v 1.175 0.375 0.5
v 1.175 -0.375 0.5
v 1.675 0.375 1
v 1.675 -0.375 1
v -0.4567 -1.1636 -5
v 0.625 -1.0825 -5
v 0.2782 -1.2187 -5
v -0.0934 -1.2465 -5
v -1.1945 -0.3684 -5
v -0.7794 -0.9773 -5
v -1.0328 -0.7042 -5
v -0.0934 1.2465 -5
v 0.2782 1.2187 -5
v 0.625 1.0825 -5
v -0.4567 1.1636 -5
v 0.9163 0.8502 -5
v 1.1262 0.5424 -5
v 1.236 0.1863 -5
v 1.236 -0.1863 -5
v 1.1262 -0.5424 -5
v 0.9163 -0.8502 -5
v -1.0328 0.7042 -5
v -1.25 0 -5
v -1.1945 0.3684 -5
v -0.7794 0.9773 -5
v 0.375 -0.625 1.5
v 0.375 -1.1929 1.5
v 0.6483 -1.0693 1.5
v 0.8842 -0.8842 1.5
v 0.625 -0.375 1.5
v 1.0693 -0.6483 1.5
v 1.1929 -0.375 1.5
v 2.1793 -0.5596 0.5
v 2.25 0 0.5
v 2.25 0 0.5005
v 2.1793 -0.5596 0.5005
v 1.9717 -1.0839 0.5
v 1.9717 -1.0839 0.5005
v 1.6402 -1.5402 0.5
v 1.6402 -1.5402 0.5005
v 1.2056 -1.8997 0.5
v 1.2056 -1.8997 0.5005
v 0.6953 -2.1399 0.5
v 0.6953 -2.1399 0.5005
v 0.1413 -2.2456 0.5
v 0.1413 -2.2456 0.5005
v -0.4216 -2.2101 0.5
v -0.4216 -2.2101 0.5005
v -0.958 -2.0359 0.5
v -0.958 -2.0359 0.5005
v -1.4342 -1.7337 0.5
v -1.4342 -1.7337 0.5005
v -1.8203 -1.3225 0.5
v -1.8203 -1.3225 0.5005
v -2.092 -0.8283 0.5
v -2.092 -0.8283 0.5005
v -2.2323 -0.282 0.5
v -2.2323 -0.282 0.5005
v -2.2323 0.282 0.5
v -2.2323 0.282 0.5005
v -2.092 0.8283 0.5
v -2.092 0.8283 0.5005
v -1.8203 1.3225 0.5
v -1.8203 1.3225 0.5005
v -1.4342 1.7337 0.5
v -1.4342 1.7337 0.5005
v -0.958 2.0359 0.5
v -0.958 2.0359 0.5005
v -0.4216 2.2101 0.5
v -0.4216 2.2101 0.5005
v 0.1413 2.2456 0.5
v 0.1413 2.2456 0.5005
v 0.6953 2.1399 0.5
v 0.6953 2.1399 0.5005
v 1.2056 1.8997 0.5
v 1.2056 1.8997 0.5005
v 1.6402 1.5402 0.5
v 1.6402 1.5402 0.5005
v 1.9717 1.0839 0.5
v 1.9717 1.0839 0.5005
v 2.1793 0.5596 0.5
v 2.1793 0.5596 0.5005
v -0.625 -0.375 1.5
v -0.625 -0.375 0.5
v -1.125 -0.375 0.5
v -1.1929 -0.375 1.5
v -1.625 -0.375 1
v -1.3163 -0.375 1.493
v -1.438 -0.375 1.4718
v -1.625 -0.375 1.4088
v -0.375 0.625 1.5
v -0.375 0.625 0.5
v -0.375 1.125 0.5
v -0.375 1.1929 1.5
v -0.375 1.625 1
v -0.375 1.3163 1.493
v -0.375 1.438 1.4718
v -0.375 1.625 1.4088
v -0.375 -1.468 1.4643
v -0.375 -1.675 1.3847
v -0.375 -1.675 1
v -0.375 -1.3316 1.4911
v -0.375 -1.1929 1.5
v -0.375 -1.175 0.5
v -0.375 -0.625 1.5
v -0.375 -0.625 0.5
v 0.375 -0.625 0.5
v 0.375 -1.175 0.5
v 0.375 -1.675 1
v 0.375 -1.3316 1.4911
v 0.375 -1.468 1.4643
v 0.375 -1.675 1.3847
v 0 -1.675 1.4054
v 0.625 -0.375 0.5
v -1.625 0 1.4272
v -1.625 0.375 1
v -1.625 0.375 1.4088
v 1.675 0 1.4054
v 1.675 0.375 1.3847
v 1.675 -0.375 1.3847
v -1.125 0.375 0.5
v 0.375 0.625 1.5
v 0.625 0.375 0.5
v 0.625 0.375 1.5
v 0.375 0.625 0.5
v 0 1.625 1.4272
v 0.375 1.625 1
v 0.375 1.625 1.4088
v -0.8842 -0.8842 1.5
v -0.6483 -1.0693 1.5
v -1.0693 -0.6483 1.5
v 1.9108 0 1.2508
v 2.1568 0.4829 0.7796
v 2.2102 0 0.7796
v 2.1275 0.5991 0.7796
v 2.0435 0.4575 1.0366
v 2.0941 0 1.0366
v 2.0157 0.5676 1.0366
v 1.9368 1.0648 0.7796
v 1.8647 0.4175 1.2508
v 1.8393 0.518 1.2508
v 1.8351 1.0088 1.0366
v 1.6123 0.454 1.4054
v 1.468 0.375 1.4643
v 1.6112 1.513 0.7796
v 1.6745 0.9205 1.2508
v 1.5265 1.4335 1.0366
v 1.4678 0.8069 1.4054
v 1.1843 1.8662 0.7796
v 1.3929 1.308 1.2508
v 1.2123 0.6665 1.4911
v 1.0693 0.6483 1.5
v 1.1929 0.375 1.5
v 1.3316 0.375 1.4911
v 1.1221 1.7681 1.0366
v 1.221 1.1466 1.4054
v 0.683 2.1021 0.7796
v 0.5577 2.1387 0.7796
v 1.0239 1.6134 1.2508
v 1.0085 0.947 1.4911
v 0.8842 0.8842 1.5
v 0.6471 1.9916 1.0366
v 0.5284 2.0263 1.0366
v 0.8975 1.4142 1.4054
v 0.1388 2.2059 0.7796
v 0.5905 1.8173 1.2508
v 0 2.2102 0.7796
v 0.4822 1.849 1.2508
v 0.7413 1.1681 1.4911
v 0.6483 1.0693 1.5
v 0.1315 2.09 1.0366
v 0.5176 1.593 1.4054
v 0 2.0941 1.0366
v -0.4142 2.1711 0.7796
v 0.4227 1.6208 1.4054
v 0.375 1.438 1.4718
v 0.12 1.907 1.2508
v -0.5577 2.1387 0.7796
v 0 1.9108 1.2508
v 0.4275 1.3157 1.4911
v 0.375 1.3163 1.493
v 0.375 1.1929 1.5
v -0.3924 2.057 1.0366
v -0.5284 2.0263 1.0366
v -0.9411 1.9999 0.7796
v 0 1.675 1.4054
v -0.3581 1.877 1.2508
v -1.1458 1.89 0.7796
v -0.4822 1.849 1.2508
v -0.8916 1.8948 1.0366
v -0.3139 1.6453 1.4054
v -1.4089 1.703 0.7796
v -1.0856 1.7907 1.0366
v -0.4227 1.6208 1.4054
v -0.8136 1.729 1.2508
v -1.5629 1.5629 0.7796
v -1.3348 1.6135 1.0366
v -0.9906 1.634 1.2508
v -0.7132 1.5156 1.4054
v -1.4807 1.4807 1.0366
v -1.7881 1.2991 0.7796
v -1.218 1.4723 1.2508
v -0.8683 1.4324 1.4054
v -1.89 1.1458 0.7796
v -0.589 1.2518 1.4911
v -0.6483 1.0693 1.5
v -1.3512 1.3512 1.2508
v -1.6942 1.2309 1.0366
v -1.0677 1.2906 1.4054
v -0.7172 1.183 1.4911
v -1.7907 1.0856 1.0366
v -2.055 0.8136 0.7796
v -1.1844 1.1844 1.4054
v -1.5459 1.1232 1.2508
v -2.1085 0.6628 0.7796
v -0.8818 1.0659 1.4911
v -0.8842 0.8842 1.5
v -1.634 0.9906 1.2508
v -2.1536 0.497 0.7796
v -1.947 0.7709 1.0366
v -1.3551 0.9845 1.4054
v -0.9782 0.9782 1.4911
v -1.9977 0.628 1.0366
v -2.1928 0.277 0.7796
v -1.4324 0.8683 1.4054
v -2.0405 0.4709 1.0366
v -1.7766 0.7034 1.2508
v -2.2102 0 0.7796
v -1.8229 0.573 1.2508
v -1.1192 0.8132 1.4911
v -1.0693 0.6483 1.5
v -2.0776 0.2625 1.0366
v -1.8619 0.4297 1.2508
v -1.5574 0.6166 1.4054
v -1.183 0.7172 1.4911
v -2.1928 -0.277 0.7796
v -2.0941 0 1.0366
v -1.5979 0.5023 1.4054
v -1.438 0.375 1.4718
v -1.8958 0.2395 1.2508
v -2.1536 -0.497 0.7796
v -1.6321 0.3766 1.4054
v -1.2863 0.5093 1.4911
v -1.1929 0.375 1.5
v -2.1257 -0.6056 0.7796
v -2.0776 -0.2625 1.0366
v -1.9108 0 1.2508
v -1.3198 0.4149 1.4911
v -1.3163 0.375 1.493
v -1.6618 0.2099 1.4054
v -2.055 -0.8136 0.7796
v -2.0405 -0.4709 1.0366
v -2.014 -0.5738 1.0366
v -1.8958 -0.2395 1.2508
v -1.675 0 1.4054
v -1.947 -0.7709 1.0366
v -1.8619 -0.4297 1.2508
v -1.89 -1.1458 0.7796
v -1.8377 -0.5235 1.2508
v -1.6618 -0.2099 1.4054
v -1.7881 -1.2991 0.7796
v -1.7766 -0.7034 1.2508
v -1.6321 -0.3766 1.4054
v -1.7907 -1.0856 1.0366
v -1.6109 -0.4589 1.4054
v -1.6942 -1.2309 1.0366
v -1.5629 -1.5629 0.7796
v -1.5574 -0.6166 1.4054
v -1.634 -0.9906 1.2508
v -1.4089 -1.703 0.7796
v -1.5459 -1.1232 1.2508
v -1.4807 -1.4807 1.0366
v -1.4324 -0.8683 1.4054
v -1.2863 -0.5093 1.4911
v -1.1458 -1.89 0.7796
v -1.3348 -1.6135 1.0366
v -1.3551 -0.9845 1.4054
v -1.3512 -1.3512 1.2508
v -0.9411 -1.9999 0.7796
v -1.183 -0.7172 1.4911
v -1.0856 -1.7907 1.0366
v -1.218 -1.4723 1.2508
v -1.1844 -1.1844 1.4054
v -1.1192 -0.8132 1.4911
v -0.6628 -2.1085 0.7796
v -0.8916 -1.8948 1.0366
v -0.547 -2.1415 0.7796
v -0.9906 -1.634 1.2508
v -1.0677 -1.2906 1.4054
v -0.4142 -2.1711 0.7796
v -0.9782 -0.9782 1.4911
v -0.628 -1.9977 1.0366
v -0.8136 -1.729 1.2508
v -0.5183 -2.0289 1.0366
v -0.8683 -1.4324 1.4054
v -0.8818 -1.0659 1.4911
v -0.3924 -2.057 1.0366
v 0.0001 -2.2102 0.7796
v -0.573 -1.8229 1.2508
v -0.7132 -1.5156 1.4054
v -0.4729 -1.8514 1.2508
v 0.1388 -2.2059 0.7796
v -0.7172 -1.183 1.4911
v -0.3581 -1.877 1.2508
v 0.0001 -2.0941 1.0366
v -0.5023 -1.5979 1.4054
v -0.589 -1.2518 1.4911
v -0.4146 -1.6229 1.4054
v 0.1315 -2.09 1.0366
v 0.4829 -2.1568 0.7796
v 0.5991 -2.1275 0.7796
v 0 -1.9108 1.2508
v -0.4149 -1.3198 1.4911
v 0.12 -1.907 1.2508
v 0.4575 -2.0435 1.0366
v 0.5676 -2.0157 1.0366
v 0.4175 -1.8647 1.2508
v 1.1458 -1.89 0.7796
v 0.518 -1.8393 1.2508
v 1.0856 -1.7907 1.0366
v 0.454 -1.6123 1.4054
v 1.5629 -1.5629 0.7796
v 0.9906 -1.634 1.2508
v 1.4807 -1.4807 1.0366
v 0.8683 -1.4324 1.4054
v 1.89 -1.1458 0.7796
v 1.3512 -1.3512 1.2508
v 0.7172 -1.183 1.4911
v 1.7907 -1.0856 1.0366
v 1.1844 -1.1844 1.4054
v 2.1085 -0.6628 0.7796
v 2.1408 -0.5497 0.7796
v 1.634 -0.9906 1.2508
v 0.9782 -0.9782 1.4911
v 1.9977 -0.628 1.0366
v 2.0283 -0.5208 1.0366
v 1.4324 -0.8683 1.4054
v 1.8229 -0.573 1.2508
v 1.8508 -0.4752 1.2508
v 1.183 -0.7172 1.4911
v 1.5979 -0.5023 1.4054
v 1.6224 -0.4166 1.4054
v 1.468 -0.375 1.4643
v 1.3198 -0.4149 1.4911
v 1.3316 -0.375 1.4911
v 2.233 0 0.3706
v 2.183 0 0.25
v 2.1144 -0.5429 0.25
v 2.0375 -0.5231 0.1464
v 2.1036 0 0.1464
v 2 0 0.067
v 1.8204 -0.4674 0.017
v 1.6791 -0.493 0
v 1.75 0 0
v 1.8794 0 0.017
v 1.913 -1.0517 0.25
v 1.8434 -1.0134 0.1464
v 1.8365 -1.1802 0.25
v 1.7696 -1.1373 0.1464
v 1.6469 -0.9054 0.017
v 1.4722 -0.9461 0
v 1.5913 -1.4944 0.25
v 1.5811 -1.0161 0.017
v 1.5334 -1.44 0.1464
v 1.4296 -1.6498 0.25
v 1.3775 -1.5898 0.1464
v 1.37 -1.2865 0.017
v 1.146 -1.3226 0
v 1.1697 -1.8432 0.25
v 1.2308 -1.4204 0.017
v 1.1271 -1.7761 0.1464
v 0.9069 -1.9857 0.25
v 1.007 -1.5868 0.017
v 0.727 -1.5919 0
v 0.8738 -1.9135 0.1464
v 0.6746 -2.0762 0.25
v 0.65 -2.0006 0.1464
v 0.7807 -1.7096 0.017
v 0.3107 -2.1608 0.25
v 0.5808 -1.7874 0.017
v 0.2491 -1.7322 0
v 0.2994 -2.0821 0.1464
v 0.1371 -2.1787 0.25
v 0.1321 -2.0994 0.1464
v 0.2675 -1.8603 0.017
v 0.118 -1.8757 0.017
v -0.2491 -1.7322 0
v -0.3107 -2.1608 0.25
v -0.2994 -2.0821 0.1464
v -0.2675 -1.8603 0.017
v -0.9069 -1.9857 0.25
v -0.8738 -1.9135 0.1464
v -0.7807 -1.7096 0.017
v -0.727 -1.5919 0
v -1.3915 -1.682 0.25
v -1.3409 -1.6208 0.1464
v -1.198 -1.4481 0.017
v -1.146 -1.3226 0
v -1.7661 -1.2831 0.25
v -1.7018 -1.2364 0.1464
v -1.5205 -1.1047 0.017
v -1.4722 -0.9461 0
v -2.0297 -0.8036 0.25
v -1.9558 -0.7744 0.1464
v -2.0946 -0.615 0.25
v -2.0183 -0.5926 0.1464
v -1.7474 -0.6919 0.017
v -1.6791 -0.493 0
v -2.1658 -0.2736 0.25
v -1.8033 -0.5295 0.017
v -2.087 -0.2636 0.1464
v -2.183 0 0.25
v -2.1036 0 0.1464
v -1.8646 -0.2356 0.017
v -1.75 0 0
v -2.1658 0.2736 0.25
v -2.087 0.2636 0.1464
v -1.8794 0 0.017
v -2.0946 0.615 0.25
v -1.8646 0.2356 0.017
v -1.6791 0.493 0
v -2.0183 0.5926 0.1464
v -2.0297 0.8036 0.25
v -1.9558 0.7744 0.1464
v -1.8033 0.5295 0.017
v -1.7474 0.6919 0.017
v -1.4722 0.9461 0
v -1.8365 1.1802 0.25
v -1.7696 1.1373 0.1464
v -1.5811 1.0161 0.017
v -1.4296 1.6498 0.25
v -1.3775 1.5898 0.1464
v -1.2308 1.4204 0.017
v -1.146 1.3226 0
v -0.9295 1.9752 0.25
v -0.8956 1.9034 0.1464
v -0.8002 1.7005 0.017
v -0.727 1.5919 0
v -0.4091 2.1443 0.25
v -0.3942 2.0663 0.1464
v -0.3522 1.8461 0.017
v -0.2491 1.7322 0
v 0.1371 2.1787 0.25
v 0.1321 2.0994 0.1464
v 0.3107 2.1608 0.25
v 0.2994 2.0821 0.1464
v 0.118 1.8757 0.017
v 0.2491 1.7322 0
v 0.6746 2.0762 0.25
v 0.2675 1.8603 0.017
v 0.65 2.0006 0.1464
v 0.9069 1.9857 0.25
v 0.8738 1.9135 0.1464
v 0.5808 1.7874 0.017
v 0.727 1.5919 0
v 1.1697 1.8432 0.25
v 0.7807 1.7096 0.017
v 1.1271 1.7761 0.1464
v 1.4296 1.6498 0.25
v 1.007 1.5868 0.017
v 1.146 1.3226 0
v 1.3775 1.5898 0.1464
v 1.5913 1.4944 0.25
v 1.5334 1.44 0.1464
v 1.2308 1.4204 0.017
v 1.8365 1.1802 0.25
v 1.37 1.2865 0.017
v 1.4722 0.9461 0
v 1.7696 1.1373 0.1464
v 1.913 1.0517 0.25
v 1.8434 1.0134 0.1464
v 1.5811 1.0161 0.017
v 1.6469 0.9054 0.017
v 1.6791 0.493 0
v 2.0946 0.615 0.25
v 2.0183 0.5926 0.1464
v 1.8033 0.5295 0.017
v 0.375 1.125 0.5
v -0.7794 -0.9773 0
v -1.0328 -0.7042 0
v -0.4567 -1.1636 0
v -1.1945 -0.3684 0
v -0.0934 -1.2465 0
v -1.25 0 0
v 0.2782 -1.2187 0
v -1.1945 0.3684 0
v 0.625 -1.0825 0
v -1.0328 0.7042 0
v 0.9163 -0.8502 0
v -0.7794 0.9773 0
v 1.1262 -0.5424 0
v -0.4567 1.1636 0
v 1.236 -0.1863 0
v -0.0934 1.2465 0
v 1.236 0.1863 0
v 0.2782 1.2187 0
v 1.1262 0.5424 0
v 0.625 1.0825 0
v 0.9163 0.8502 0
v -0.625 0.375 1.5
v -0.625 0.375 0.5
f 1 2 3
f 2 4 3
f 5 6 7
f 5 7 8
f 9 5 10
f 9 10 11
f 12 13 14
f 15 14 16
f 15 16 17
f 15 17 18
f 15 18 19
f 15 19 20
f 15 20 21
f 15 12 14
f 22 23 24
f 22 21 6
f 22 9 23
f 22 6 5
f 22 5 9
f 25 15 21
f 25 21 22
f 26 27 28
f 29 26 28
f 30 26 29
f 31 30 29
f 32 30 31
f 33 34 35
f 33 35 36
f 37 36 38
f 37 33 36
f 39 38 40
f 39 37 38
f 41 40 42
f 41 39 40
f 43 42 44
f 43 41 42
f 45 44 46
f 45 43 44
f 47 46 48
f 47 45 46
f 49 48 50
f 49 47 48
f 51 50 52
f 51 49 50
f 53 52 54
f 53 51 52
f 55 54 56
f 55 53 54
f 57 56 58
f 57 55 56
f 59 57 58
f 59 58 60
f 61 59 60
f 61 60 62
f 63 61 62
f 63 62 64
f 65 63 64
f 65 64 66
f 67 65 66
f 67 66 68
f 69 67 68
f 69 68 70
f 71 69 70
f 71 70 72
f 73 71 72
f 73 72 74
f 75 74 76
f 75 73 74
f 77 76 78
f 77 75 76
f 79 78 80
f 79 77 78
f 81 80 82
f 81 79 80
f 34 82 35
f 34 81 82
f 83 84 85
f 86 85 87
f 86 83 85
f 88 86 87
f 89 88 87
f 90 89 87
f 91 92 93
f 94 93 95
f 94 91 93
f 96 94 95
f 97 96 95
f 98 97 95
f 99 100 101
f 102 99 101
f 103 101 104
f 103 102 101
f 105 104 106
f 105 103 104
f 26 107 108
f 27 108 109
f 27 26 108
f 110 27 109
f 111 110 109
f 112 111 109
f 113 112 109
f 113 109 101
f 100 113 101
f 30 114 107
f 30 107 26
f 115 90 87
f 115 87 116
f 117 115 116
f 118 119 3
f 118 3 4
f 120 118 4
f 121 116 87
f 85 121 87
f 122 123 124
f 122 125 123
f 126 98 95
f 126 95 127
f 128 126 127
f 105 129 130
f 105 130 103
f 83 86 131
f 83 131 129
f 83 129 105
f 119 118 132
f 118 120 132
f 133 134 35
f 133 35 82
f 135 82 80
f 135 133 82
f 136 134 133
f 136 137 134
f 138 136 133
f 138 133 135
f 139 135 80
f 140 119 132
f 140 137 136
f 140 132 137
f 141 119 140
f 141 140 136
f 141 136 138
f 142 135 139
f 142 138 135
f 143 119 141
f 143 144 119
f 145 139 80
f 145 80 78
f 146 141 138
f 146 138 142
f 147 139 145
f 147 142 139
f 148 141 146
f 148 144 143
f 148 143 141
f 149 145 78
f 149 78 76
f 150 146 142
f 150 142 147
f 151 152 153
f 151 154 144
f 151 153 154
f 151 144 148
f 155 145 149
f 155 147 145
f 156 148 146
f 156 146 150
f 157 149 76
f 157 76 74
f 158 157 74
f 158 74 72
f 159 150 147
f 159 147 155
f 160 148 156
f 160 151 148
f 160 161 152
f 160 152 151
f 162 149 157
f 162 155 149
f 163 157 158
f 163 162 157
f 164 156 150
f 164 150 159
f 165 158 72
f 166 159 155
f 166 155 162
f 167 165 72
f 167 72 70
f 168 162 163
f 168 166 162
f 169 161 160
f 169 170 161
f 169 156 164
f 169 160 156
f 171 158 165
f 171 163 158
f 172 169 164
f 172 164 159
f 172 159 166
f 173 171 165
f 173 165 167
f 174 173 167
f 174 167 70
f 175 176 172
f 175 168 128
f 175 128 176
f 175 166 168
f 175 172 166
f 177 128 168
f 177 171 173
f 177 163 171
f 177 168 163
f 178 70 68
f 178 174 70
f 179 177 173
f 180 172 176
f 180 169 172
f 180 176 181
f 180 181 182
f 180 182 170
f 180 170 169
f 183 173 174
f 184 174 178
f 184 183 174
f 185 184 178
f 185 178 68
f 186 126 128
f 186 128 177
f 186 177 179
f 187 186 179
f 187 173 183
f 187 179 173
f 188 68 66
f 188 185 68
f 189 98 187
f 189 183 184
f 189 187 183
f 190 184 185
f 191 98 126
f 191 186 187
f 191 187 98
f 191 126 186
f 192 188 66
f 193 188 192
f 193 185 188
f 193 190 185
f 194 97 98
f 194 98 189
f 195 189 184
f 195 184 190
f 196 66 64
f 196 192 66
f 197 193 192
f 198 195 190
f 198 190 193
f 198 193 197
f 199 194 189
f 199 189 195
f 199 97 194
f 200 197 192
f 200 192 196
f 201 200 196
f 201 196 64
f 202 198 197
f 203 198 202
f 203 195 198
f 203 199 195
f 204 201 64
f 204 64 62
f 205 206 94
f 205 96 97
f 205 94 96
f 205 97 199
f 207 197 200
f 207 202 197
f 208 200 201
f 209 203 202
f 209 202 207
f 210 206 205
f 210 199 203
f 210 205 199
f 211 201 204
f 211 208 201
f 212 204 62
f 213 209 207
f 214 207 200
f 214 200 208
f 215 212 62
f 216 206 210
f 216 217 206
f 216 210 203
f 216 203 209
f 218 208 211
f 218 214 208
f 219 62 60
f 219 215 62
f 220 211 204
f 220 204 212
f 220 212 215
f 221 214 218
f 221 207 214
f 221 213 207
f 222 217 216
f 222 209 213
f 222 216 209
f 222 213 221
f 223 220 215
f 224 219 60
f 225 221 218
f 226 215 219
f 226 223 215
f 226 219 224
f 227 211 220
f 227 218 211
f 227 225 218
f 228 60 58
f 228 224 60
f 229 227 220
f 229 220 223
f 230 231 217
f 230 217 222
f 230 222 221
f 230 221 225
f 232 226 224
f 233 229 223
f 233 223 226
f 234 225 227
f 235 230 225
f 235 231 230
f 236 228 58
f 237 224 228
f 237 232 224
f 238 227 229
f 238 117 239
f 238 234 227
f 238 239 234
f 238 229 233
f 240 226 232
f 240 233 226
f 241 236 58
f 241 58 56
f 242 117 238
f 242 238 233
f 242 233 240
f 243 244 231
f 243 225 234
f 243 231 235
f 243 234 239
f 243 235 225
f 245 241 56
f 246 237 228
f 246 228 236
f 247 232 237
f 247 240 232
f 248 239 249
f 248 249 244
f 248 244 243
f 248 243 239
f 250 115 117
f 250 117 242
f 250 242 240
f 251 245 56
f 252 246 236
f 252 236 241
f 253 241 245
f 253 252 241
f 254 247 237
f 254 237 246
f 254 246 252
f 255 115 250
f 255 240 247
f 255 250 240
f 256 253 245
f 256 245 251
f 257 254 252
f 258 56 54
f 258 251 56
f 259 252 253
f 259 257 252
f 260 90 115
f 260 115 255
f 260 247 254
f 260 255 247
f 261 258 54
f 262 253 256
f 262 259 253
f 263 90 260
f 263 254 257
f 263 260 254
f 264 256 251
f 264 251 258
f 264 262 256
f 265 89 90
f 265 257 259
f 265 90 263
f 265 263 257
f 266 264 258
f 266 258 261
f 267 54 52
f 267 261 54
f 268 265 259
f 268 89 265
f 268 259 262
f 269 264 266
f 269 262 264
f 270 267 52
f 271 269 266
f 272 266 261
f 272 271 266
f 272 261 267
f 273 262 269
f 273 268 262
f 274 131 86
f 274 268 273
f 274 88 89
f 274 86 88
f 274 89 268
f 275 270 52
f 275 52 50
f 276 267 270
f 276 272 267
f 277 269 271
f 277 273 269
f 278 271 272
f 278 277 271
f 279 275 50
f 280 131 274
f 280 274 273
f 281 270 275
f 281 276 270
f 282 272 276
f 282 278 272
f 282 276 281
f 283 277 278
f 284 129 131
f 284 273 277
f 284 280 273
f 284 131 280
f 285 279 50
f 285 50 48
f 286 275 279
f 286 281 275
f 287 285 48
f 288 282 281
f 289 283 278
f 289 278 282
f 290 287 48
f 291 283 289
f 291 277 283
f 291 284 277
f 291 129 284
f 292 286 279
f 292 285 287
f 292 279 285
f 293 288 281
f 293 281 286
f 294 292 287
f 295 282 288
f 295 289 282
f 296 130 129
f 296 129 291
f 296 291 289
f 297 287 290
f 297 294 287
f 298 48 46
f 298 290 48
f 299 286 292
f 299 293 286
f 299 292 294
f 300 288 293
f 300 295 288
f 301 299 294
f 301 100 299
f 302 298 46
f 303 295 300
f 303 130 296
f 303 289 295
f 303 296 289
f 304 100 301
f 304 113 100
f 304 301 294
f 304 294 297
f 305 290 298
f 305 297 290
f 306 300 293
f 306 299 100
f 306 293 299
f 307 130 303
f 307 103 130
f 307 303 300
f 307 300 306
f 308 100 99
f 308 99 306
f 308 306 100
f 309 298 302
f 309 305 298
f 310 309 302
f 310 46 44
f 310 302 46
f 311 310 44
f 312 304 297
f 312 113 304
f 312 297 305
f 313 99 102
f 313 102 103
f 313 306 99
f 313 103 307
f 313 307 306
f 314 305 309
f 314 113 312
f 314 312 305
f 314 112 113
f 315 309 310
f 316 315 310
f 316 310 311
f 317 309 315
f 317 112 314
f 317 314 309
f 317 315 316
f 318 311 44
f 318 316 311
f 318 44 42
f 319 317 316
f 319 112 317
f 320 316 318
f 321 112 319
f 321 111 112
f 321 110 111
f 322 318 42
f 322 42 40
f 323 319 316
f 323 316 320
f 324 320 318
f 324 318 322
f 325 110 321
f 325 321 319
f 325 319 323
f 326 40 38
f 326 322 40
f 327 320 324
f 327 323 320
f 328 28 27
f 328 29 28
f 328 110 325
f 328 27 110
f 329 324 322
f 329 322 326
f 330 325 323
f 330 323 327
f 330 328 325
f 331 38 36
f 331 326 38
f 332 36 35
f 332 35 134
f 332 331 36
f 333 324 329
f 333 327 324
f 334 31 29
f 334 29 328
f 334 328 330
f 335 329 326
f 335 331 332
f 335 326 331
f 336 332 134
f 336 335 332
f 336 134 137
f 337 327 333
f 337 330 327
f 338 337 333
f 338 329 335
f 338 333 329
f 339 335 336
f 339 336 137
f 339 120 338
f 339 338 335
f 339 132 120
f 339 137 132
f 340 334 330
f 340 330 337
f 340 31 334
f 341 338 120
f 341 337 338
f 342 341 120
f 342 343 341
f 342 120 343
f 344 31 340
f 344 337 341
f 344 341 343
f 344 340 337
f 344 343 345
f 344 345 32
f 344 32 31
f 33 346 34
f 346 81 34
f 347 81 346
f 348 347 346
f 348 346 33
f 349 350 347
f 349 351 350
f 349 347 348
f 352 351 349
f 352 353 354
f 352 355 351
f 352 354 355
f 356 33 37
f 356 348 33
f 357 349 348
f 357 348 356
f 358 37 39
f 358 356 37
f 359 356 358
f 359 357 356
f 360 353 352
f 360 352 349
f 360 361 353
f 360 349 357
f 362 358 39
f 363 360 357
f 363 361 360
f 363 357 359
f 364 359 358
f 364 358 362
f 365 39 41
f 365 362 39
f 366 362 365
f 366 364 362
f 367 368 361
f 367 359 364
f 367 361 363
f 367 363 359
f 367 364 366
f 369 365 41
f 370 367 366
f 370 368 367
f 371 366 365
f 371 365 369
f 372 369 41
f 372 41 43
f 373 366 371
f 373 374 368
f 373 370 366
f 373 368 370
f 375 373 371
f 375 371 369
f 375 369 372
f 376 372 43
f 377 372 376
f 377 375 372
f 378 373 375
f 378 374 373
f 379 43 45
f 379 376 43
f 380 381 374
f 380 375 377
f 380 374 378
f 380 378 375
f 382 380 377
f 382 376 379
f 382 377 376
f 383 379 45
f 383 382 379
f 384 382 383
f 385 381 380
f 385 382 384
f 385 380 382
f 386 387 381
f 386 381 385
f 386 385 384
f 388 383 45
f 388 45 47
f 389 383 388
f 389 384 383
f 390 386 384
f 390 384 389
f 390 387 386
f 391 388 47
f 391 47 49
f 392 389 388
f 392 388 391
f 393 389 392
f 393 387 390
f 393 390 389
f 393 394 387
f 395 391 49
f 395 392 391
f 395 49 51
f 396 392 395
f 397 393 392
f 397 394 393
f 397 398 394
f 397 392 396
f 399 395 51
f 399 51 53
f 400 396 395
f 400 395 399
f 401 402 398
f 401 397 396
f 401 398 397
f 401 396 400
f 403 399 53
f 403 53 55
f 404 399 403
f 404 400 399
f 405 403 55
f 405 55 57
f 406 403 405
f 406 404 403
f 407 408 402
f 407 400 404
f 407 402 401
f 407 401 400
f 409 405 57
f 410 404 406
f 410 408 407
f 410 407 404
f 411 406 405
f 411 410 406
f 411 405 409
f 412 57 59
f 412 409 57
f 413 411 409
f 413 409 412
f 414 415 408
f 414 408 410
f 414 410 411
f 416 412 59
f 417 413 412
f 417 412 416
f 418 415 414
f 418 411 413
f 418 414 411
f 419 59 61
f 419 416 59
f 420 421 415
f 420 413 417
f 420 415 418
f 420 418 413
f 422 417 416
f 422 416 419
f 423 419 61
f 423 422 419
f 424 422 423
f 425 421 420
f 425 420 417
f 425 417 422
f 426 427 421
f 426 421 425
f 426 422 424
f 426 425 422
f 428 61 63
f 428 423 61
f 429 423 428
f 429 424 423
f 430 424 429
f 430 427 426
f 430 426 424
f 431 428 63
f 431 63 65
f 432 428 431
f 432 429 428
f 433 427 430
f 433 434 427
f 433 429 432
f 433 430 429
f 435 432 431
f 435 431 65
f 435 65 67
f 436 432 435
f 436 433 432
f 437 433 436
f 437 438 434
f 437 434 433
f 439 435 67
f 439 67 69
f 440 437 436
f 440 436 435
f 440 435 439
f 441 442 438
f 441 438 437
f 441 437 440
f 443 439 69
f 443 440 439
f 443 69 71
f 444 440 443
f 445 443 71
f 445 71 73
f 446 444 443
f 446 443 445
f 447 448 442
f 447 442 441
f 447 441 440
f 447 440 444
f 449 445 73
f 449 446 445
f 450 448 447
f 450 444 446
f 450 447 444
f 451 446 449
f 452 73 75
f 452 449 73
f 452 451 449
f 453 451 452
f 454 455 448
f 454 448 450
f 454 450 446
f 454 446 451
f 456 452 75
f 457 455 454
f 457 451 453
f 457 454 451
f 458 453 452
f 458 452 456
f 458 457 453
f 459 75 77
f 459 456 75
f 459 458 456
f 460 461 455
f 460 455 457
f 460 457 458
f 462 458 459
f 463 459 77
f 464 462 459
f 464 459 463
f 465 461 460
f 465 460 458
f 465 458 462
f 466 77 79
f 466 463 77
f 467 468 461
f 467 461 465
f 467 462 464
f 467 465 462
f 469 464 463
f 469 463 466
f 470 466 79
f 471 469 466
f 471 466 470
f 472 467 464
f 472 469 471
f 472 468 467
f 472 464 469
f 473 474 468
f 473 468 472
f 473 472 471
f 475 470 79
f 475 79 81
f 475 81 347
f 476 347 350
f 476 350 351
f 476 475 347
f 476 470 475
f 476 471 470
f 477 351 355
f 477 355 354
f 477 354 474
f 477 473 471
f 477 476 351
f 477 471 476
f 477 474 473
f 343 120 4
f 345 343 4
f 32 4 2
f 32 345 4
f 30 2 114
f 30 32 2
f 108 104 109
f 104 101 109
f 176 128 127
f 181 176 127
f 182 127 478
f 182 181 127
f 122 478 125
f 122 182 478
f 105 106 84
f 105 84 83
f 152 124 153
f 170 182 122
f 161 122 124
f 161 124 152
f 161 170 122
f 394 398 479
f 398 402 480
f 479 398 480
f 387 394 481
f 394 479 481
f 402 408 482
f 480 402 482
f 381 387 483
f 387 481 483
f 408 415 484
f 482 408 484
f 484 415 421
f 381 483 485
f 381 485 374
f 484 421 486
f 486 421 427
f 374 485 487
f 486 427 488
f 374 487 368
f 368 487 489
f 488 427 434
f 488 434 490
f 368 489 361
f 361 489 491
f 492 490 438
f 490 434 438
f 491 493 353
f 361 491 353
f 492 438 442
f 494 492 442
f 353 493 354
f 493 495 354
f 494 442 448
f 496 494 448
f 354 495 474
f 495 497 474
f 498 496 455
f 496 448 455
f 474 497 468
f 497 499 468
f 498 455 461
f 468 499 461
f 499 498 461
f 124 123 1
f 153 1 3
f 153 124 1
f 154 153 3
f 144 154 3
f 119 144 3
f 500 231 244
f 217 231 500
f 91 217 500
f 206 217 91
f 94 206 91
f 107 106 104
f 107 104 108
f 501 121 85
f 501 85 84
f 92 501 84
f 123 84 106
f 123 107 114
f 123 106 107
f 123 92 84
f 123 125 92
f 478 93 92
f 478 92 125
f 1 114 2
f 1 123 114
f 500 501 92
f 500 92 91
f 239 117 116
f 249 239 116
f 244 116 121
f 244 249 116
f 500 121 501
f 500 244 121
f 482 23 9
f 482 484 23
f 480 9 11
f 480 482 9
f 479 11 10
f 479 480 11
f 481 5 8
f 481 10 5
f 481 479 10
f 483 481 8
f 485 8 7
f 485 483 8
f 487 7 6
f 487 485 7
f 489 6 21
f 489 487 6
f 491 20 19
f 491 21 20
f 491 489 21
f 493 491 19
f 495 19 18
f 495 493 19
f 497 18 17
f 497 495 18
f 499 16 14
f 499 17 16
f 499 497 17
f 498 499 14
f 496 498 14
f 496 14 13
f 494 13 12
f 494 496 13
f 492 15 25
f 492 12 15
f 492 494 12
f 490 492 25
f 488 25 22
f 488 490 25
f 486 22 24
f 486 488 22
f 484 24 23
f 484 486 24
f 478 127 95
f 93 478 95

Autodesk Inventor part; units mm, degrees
ref_plane "YZ Plane" through (0, 0, 0) normal (1, 0, 0) x (0, 1, 0)
ref_plane "XZ Plane" through (0, 0, 0) normal (0, 1, 0) x (-1, 0, 0)
ref_plane "XY Plane" through (0, 0, 0) normal (0, 0, 1) x (1, 0, 0)
sketch "Sketch1" plane through (0, 0, 0) normal (0, 0, 1) x (1, 0, 0)
  circle A0 centre (0, 0) radius 2.25
  dimension "d0" = 4.5
extrude "Extrusion1" add sketch "Sketch1" along normal blind 1.5
fillet "Fillet1" radius 0.5 1 edges at (-2.25, 0, 0)
fillet "Fillet2" radius 1 1 edges at (-2.25, 0, 1.5)
sketch "Sketch2" plane through (0, 0, 1.5) normal (0, 0, 1) x (1, 0, 0)
  line L0 (1.675, 0.375) -> (1.675, -0.375)
  line L1 (-1.625, -0.375) -> (-1.625, 0.375)
  line L2 (-0.375, 1.625) -> (0.375, 1.625)
  line L3 (0.375, -1.675) -> (-0.375, -1.675)
  line L4 (-0.375, -1.675) -> (-0.375, -0.375)
  line L5 (-0.375, 0.375) -> (-0.375, 1.625)
  line L6 (-1.625, 0.375) -> (-0.375, 0.375)
  line L7 (0.375, 0.375) -> (1.675, 0.375)
  line L8 (0.375, 1.625) -> (0.375, 0.375)
  line L9 (0.375, -0.375) -> (0.375, -1.675)
  line L10 (1.675, -0.375) -> (0.375, -0.375)
  line L11 (-0.375, -0.375) -> (-1.625, -0.375)
  circle A0 centre (0, 0) radius 1.25 projected
  dimension "d5" = 0.75
  dimension "d6" = 3.3
  dimension "d9" = 0.75
  dimension "d10" = 3.3
  dimension "d28" = 0.75
  dimension "d29" = 0.75
  dimension "d30" = 0.375
  dimension "d31" = 0.375
  dimension "d32" = 0.375
  dimension "d33" = 0.375
  dimension "d34" = 1.25
  dimension "d35" = 1.25
extrude "Extrusion2" cut sketch "Sketch2" against normal blind 1 contours L0 L10 A0 L7 | A0 L10 L9 L4 L11 L6 L5 L8 L7 | A0 L5 L2 L8 | L9 L3 L4 A0 | A0 L11 L1 L6
chamfer "Chamfer2" distance 0.25 angle 45 4 edges at (-0.375, 0.375, 1) (-0.375, -0.375, 1) (0.375, 0.375, 1) (0.375, -0.375, 1)
sketch "Sketch3" plane through (0, 0, 0) normal (0, 0, -1) x (-1, 0, 0)
  circle A0 centre (0, 0) radius 1.75 projected
  circle A1 centre (0, 0) radius 1.25
  dimension "d19" = 2.5
extrude "Extrusion3" add sketch "Sketch3" along normal blind 5 contours A1
thread "Thread1" size "M2.5x0.45" class "6g" standard "ANSI Metric M Profile" full length
chamfer "倒角3" distance 0.5 angle 45 4 edges at (-1.625, 0, 0.5) (0, 1.625, 0.5) (0, -1.675, 0.5) (1.675, 0, 0.5)
properties part number "screw_M3_5"
